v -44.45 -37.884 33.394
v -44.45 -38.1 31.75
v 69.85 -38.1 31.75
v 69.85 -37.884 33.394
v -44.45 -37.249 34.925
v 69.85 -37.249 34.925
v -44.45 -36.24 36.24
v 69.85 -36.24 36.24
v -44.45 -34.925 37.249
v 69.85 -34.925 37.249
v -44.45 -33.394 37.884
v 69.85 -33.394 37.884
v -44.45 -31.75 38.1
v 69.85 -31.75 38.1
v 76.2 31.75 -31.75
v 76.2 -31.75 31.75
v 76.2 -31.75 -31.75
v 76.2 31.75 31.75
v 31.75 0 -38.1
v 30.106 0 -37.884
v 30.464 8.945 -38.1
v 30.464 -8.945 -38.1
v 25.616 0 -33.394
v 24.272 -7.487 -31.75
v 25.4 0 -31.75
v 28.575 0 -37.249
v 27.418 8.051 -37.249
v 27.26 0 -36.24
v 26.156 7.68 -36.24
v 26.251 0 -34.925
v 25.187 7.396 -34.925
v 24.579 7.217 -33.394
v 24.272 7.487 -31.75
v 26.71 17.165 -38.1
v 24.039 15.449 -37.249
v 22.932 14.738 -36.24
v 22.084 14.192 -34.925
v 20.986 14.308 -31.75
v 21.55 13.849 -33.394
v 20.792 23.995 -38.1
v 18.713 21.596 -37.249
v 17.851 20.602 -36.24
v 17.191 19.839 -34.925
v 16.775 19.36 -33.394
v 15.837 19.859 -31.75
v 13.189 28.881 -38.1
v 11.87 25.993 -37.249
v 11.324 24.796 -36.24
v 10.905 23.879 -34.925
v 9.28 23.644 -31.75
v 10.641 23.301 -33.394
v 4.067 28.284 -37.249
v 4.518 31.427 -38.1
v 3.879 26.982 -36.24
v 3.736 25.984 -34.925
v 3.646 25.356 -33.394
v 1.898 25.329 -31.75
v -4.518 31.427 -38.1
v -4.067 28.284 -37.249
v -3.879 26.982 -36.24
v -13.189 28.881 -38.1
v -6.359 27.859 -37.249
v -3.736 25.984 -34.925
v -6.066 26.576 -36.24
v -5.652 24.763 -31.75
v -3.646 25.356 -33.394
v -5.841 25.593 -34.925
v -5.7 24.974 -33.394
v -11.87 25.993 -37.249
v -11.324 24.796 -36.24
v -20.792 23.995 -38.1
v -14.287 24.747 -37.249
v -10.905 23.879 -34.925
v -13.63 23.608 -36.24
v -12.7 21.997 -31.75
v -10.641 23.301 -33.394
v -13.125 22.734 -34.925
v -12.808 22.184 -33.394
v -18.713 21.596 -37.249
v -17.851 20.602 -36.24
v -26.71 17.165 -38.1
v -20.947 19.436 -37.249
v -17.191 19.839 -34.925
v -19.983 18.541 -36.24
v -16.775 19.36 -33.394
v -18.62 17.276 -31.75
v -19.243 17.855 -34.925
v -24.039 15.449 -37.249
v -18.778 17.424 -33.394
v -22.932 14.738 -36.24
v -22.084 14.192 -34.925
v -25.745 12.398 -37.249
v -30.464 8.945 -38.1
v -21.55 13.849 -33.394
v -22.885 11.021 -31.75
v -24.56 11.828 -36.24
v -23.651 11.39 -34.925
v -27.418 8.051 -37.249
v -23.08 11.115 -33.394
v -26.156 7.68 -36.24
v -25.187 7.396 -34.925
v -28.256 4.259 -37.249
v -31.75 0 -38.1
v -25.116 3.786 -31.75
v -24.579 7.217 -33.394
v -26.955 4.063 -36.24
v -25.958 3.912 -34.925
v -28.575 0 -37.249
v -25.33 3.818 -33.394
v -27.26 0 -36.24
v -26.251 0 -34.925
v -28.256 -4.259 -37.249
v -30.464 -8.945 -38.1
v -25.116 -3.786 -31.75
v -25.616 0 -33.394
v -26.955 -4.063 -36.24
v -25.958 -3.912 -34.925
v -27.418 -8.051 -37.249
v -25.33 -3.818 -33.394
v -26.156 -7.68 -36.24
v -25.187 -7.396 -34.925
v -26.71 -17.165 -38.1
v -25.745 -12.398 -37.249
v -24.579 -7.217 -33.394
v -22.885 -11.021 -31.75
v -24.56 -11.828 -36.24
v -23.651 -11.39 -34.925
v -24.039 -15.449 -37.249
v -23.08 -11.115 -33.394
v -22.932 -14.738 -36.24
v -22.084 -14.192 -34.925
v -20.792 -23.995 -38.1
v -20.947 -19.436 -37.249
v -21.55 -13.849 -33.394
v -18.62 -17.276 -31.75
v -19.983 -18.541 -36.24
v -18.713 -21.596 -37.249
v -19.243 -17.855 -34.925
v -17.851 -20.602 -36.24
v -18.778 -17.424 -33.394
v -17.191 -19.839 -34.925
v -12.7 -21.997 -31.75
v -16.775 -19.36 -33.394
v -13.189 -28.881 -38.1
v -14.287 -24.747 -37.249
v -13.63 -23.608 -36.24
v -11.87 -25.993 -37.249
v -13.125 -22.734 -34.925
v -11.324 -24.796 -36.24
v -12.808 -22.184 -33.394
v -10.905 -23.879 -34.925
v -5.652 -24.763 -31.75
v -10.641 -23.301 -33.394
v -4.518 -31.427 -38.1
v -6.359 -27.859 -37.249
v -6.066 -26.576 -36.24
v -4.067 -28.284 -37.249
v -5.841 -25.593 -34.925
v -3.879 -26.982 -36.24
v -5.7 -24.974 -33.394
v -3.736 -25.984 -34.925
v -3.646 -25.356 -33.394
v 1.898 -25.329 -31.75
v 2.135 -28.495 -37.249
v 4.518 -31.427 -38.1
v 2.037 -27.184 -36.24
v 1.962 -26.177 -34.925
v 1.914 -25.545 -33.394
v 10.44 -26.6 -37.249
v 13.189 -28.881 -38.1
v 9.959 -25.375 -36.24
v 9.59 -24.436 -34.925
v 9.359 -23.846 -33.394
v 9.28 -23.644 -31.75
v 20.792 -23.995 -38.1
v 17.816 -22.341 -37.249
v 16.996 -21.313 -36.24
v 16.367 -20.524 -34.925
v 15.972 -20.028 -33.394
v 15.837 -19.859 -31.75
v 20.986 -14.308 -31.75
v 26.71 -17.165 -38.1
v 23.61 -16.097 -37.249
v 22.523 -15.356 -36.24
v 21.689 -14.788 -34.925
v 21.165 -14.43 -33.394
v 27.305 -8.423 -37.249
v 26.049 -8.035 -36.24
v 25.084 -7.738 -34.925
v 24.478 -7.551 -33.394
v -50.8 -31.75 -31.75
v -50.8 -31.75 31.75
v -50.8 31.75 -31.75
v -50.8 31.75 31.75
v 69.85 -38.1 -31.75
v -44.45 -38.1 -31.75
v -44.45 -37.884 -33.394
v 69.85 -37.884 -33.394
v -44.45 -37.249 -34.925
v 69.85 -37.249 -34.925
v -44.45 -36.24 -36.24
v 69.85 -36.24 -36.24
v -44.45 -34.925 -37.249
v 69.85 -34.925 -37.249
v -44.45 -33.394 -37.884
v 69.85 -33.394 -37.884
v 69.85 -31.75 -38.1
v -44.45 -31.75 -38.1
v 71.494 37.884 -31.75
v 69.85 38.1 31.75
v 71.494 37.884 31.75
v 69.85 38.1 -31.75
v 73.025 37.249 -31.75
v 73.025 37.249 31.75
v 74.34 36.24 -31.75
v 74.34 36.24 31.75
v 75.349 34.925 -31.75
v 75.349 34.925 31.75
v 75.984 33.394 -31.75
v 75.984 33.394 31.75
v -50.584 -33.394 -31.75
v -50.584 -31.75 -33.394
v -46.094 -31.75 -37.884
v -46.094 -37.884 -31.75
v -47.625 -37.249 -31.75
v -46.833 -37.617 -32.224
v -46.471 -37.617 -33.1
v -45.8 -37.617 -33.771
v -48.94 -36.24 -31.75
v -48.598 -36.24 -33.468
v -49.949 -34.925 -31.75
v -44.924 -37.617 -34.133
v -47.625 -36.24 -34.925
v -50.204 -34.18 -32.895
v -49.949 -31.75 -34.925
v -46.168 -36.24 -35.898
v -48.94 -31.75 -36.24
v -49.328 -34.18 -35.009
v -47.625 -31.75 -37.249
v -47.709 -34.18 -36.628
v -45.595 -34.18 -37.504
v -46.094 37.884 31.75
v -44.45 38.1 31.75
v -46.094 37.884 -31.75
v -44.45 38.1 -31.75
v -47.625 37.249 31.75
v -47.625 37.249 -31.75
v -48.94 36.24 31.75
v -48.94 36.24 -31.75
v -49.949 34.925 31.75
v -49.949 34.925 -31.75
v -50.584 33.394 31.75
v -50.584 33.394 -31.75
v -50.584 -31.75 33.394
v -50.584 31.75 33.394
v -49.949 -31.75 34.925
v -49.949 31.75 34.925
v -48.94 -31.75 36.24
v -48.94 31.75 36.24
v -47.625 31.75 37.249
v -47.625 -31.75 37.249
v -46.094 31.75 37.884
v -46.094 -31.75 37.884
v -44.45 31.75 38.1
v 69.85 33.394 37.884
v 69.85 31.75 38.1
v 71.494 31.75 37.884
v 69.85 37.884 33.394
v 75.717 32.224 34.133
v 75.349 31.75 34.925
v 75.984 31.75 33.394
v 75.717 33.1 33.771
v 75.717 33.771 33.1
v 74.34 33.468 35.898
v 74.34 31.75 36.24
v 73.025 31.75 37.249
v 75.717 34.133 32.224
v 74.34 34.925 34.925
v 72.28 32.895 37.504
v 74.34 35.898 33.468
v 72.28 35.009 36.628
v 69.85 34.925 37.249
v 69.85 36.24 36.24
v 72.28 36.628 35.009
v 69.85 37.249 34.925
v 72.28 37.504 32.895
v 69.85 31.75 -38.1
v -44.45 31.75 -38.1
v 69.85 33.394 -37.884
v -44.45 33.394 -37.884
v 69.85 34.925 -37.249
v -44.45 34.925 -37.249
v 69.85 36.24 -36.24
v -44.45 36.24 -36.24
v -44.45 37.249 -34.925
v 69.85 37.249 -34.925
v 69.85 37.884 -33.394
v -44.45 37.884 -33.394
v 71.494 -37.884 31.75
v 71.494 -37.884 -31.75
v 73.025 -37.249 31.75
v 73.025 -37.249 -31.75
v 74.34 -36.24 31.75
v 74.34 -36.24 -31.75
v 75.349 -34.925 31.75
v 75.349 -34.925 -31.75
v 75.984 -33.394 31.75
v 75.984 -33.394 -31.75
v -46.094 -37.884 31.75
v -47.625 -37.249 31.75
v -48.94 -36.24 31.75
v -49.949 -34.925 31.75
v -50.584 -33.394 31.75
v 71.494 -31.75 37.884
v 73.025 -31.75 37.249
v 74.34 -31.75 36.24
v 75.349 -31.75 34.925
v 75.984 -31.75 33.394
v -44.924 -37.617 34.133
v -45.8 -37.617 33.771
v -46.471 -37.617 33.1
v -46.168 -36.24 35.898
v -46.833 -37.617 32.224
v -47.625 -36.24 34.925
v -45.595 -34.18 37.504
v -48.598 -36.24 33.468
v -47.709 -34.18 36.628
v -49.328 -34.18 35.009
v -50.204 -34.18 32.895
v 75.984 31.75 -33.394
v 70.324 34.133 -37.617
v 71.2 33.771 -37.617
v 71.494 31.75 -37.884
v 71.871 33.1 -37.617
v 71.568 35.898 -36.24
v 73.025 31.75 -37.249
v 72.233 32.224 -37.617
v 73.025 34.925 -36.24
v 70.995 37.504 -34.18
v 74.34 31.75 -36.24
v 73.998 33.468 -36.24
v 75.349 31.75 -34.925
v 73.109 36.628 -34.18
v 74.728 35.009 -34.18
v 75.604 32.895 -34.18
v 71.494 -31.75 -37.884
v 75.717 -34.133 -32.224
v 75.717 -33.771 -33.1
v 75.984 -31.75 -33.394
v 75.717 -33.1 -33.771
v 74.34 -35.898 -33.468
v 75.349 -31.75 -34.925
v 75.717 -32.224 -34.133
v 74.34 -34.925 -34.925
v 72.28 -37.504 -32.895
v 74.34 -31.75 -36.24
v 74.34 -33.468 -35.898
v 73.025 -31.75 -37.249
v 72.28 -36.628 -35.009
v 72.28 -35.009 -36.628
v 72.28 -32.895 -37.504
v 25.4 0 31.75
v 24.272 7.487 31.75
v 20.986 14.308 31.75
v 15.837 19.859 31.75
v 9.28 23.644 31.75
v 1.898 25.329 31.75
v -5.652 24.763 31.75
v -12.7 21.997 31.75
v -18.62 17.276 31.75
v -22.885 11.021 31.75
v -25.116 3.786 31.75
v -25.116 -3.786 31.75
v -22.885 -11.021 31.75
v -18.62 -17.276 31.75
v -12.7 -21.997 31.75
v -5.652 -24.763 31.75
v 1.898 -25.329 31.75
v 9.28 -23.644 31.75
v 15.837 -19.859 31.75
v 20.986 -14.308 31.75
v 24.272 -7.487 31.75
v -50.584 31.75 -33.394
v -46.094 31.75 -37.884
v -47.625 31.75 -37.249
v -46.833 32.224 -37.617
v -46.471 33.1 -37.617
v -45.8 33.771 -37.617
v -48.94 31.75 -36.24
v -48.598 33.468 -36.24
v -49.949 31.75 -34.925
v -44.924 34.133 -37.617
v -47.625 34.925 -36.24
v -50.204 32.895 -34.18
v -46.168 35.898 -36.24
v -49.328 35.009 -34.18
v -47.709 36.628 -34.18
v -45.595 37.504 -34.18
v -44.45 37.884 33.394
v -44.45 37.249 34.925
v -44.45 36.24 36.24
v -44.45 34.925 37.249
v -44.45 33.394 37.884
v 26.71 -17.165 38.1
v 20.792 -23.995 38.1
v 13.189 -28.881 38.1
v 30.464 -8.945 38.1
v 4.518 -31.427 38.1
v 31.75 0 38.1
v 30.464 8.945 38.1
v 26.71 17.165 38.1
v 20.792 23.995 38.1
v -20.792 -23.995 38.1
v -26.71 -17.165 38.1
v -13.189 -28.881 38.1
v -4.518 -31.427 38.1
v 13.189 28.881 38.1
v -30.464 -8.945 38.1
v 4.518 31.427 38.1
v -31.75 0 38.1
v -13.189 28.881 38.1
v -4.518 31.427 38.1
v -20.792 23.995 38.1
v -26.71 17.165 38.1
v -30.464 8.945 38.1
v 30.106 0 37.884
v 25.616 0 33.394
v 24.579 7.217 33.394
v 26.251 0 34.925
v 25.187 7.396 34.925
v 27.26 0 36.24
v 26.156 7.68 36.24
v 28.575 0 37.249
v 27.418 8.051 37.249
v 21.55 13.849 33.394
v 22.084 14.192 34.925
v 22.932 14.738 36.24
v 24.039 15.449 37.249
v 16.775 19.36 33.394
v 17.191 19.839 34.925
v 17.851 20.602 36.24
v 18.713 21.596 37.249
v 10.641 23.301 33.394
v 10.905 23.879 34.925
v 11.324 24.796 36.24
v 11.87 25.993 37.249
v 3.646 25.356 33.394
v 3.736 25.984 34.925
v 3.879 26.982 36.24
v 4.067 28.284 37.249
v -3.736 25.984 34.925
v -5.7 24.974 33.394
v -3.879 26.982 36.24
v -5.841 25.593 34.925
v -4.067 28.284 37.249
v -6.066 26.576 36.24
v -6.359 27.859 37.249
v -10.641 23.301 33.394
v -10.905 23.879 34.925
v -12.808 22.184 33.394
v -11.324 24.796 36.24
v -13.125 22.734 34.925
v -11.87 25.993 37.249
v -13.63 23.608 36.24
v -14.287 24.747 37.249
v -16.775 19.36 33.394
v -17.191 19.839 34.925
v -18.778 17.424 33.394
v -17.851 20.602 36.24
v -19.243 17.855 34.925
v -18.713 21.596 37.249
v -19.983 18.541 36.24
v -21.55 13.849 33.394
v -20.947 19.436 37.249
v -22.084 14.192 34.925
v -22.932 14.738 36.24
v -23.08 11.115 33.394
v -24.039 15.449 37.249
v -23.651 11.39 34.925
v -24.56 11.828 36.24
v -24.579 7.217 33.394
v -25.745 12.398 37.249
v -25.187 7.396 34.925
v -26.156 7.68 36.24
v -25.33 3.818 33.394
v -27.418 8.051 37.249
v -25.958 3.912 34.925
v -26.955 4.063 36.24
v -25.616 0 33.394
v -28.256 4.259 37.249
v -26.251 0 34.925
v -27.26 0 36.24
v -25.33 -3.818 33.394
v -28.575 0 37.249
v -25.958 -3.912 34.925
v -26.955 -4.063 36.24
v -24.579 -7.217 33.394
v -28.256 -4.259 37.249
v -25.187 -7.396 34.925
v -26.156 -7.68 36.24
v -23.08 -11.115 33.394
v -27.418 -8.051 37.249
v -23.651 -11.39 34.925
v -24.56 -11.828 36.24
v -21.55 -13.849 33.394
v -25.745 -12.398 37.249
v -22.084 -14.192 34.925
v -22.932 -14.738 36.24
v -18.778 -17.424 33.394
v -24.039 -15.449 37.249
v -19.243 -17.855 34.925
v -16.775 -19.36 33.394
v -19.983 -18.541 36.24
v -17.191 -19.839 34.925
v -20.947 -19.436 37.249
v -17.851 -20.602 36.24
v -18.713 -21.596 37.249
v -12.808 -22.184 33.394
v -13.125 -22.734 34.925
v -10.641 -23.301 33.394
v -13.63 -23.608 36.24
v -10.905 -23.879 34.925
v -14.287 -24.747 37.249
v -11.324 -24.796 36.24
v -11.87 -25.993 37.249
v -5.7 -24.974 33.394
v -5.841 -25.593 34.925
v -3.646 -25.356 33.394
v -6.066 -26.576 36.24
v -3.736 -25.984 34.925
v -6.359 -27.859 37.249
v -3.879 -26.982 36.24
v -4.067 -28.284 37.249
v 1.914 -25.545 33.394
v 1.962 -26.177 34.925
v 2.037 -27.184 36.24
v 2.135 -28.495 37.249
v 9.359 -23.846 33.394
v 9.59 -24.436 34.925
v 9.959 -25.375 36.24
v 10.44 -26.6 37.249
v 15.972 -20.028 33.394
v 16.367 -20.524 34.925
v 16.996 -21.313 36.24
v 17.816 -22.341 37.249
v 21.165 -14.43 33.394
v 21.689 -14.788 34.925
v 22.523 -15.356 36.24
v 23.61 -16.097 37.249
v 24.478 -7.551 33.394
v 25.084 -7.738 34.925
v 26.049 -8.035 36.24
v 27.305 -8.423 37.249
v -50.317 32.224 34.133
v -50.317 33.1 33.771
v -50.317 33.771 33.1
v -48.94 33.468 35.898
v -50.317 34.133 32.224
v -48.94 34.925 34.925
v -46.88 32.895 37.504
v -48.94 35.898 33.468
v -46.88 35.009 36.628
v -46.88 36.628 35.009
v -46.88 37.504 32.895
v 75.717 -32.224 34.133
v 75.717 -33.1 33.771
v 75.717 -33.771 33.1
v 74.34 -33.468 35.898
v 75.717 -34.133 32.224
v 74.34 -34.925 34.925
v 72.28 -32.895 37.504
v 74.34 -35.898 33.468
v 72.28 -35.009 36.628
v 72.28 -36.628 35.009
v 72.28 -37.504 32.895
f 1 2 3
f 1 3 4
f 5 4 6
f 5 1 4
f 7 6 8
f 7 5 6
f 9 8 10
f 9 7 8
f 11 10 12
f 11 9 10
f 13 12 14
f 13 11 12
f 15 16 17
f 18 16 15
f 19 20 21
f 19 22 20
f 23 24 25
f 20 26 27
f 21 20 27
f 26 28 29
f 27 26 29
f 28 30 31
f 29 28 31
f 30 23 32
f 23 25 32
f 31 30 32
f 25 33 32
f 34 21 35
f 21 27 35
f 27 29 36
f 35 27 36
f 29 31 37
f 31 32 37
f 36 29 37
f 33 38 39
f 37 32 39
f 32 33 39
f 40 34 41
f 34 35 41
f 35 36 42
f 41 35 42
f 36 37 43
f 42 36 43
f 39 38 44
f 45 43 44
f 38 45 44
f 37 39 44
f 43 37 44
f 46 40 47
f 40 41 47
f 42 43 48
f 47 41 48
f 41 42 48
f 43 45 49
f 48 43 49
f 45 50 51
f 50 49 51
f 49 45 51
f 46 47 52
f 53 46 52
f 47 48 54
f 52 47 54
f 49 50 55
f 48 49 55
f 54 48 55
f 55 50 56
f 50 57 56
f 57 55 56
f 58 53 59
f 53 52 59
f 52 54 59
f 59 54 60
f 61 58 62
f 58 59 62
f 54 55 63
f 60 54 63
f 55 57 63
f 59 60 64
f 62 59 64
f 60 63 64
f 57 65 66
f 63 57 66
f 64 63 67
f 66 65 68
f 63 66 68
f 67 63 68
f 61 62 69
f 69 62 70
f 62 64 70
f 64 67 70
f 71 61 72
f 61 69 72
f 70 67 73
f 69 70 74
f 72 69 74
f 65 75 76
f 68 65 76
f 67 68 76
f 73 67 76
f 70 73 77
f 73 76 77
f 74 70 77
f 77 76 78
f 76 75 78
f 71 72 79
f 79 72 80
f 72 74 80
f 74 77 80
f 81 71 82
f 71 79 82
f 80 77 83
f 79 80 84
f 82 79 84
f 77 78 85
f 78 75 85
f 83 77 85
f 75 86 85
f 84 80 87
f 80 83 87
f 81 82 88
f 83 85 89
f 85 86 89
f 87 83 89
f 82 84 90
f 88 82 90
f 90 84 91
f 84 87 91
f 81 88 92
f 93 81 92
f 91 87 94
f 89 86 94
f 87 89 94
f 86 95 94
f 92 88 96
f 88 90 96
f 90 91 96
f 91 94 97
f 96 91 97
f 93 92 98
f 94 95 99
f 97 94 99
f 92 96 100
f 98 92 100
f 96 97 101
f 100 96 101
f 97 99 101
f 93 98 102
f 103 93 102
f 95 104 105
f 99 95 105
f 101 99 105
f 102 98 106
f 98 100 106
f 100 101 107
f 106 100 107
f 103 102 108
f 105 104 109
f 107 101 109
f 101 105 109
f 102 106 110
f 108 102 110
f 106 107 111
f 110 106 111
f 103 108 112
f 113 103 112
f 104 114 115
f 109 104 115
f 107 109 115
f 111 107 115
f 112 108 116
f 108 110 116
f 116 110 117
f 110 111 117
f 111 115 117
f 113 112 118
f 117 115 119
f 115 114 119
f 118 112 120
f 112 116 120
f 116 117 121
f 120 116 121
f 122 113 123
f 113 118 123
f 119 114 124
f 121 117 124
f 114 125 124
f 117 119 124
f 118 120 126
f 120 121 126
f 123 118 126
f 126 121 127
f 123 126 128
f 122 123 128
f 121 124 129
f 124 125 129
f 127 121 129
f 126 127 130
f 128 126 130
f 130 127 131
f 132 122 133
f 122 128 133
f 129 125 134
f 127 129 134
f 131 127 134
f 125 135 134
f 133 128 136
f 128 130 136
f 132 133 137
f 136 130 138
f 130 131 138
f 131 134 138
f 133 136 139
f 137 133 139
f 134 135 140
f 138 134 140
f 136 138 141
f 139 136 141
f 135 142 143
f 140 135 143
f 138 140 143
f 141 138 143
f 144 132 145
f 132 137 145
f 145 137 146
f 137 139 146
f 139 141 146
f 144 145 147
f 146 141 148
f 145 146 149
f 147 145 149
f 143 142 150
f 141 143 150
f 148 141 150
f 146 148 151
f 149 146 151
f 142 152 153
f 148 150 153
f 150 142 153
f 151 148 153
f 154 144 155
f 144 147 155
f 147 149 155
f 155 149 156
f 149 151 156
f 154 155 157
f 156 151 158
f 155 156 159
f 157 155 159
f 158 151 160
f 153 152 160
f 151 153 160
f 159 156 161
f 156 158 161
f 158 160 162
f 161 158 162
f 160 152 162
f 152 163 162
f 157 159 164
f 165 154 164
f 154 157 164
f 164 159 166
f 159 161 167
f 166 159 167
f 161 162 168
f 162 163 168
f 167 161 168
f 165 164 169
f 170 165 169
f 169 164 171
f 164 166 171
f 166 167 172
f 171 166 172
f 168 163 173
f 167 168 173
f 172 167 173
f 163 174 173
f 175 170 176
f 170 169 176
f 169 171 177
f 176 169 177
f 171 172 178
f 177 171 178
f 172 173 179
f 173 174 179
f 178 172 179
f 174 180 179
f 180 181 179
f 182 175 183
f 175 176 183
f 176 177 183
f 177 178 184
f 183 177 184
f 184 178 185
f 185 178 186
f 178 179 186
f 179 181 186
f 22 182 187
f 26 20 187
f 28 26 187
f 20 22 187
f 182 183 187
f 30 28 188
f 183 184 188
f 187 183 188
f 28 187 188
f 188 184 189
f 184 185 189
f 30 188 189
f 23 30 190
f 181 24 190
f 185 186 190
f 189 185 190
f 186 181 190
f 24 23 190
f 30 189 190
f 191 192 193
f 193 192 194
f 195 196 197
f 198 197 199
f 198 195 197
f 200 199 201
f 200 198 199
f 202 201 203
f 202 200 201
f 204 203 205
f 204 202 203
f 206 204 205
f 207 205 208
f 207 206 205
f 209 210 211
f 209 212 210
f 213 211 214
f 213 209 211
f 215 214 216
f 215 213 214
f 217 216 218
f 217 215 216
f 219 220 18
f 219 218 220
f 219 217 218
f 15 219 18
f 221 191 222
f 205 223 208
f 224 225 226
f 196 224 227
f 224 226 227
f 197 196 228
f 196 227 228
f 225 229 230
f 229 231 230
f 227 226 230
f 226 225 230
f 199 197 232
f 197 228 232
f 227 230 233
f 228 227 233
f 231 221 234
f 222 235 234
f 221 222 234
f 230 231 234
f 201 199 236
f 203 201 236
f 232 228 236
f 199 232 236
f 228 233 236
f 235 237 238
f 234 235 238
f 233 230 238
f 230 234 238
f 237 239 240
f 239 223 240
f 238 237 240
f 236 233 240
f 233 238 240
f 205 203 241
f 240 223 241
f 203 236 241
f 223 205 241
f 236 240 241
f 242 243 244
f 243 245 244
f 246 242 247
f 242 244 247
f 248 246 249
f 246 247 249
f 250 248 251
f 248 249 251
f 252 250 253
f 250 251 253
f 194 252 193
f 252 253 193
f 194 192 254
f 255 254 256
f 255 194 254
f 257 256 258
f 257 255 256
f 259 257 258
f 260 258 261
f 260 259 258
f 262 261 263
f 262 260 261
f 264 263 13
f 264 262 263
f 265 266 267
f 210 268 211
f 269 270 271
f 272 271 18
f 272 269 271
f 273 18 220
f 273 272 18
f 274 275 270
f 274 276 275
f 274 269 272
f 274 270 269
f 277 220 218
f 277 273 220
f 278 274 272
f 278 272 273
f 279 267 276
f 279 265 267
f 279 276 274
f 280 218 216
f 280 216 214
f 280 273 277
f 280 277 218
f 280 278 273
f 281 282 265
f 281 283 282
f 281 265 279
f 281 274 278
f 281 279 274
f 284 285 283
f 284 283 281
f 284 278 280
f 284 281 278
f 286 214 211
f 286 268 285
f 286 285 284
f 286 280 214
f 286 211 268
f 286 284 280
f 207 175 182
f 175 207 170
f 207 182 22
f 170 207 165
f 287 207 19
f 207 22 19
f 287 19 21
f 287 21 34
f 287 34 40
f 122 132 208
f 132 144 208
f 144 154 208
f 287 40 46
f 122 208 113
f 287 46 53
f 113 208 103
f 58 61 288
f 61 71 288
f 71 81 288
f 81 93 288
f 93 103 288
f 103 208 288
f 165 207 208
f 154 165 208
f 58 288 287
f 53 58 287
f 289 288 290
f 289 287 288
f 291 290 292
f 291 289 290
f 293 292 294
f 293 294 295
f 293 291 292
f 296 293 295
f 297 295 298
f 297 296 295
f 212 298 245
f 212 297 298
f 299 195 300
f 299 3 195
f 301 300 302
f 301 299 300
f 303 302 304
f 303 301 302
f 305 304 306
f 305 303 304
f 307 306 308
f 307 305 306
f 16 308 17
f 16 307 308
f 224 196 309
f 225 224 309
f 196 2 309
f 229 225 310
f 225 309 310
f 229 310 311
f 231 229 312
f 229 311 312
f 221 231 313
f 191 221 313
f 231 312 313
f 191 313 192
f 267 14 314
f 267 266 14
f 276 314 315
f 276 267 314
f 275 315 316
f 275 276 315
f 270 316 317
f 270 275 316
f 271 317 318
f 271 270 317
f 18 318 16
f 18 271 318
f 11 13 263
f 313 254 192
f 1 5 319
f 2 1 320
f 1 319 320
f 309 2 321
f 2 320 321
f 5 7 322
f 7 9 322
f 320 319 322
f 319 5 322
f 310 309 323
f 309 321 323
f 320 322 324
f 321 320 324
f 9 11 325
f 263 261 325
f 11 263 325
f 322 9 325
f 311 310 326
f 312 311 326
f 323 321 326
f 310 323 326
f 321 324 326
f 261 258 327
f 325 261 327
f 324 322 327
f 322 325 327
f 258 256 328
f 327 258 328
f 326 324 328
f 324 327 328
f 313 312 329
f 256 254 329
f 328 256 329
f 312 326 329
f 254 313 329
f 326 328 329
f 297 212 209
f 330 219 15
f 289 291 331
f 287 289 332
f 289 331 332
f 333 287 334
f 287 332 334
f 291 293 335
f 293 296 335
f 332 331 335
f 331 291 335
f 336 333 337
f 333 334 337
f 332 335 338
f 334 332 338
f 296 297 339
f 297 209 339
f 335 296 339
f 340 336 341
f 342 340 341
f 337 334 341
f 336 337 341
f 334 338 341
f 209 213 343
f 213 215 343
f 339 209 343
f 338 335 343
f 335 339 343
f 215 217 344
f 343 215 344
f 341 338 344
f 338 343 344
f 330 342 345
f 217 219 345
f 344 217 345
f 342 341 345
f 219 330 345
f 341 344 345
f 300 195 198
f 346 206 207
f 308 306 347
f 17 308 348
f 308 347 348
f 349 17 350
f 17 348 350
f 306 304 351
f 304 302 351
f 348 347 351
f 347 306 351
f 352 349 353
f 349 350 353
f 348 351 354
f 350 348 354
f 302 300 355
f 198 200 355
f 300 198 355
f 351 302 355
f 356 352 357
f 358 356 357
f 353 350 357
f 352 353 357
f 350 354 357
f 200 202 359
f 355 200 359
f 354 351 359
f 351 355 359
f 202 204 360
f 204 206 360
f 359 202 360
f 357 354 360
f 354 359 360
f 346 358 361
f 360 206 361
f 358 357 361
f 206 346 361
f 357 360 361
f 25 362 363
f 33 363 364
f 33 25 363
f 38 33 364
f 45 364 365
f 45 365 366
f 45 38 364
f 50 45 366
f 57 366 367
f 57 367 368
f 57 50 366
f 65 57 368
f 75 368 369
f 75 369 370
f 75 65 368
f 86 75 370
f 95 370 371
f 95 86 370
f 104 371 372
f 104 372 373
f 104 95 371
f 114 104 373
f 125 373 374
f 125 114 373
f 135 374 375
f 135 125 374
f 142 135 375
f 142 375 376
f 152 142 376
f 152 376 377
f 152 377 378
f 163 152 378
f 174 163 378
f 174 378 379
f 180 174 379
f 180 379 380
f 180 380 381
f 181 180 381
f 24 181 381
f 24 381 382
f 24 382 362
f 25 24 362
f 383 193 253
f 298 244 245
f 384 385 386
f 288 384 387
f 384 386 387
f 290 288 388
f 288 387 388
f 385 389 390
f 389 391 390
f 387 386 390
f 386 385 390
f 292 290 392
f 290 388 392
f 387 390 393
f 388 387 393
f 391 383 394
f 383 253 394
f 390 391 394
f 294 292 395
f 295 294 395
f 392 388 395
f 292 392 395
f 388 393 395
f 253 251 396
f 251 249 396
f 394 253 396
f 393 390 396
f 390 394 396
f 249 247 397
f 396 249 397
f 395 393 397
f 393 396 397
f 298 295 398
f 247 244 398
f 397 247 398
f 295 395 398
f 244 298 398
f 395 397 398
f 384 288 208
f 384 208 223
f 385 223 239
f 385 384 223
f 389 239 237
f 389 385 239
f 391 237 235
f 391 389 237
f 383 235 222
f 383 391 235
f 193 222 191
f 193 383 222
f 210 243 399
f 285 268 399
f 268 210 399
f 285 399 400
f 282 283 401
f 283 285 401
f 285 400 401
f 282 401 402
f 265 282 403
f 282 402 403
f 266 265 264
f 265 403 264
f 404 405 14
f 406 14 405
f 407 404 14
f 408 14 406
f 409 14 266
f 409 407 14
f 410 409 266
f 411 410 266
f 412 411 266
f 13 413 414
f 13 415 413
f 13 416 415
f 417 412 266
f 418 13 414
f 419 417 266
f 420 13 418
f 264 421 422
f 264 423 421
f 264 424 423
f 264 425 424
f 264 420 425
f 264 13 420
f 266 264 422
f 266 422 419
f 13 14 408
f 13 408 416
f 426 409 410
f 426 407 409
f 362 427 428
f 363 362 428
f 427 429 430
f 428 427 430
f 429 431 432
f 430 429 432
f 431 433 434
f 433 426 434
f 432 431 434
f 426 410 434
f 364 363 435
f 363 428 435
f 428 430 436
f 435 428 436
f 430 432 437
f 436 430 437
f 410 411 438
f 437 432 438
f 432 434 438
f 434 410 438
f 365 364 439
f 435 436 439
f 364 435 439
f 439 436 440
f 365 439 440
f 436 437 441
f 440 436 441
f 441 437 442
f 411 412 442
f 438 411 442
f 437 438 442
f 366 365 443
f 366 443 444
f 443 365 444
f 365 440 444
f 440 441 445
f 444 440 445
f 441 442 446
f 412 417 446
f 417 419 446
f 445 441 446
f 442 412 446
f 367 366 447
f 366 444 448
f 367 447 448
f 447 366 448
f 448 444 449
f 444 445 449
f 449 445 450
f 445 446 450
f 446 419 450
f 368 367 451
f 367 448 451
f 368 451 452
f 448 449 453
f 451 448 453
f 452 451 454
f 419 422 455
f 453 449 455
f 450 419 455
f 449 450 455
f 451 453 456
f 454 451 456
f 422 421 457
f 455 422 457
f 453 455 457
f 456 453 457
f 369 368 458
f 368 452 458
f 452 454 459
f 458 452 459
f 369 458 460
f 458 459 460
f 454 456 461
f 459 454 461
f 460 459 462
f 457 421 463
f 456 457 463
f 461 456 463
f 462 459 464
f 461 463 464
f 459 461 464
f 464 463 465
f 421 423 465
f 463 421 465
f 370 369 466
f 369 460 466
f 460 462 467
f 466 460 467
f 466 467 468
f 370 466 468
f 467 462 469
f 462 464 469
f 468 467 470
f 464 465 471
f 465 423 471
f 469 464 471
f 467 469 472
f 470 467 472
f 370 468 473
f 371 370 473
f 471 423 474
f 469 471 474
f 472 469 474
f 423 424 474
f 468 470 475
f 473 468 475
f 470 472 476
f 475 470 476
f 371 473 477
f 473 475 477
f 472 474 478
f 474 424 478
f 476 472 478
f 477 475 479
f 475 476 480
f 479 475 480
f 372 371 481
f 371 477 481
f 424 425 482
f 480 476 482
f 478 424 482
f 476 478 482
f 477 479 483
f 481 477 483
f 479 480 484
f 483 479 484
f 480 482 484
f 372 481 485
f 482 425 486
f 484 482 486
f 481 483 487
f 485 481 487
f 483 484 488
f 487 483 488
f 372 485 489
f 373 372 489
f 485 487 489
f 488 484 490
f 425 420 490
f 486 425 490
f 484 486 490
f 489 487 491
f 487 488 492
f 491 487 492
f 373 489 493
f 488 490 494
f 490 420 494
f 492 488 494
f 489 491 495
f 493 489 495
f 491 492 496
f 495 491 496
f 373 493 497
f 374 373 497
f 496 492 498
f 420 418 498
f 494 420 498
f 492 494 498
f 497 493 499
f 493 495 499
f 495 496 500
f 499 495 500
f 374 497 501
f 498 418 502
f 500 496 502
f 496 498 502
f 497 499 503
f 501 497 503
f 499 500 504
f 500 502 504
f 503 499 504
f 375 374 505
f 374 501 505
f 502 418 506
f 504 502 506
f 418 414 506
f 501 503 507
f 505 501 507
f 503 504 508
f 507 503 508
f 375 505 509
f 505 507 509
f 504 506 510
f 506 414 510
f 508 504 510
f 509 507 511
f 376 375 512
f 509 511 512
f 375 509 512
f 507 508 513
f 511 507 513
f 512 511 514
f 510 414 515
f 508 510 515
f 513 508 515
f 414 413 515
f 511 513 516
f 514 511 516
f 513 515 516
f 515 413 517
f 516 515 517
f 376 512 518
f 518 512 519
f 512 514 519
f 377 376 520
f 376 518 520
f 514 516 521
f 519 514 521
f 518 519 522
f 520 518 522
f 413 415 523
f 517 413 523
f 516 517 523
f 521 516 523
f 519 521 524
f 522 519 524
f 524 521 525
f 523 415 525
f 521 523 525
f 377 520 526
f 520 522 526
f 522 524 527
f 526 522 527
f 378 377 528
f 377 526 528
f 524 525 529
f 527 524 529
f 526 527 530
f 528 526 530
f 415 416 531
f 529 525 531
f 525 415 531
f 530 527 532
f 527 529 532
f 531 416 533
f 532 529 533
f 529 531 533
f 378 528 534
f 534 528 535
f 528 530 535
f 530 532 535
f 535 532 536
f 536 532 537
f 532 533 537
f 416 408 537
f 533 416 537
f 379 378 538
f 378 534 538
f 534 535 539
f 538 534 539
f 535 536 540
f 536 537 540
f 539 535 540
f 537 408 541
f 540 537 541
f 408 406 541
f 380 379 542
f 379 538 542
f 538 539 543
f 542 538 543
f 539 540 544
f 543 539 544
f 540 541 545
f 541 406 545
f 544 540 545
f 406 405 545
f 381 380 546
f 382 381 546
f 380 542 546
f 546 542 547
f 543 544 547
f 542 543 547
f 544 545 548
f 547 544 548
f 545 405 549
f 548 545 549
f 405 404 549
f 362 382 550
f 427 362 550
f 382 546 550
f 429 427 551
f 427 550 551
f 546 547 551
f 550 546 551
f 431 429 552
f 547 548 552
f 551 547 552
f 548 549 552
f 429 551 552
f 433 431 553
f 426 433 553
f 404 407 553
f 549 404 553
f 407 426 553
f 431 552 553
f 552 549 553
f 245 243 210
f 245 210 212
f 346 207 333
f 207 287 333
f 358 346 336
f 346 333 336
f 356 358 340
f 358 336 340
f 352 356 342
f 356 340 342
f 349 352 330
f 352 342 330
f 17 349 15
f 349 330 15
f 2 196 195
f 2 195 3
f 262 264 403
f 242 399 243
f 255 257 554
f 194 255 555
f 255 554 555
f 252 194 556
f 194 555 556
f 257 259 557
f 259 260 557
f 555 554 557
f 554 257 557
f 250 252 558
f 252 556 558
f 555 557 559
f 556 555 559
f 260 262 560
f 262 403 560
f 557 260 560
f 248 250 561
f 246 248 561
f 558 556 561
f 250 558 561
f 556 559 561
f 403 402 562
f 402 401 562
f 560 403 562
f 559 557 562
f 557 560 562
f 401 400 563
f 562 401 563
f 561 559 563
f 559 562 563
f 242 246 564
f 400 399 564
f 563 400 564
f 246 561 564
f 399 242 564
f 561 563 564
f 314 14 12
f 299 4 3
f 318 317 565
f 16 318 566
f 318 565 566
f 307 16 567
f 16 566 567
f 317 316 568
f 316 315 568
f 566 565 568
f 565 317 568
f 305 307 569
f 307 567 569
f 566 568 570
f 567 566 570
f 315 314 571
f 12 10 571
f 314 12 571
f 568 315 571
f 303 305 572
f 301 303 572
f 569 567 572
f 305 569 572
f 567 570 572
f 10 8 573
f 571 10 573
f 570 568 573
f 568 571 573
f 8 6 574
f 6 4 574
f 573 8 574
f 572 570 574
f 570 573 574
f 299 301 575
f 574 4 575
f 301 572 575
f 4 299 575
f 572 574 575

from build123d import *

# Parameters (mm, degrees)
F0_W     = 101.6
F0_H     = 76.2
F0_R     = 25.4
F1_DEPTH = 38.1
F2_DEPTH = 25.4
F3_R     = 6.34999


# Not quite as in the source:
# - a fillet or chamfer is up to 0.001 mm smaller than in the source, because OpenCascade refuses the exact size


with BuildPart() as f1:
    # F0 (on Top) → F1 (new body, symmetric)
    with BuildSketch(Plane.XY):
        Rectangle(F0_W, F0_H)
        Circle(F0_R, mode=Mode.SUBTRACT)
    extrude(amount=F1_DEPTH, both=True)

    # F2 (add): a face of the model
    f2_faces = [f1.faces().sort_by_distance(p)[0] for p in [
        (50.8, 0, 0),
    ]]
    extrude(f2_faces, amount=F2_DEPTH)

    # F3 (radius 6.35 in the source; OpenCascade refuses exactly that, so slightly less here)
    f3_edges = [f1.edges().sort_by_distance(p)[0] for p in [
        (12.7, 38.1, 38.1),
        (-50.8, 0, 38.1),
        (12.7, -38.1, 38.1),
        (76.2, 0, 38.1),
        (-25.4, 0, 38.1),
        (-50.8, 38.1, 0),
        (-50.8, 0, -38.1),
        (-50.8, -38.1, 0),
        (76.2, 38.1, 0),
        (12.7, 38.1, -38.1),
        (12.7, -38.1, -38.1),
        (76.2, -38.1, 0),
        (76.2, 0, -38.1),
        (-25.4, 0, -38.1),
    ]]
    fillet(f3_edges, radius=F3_R)


solid = f1.part
